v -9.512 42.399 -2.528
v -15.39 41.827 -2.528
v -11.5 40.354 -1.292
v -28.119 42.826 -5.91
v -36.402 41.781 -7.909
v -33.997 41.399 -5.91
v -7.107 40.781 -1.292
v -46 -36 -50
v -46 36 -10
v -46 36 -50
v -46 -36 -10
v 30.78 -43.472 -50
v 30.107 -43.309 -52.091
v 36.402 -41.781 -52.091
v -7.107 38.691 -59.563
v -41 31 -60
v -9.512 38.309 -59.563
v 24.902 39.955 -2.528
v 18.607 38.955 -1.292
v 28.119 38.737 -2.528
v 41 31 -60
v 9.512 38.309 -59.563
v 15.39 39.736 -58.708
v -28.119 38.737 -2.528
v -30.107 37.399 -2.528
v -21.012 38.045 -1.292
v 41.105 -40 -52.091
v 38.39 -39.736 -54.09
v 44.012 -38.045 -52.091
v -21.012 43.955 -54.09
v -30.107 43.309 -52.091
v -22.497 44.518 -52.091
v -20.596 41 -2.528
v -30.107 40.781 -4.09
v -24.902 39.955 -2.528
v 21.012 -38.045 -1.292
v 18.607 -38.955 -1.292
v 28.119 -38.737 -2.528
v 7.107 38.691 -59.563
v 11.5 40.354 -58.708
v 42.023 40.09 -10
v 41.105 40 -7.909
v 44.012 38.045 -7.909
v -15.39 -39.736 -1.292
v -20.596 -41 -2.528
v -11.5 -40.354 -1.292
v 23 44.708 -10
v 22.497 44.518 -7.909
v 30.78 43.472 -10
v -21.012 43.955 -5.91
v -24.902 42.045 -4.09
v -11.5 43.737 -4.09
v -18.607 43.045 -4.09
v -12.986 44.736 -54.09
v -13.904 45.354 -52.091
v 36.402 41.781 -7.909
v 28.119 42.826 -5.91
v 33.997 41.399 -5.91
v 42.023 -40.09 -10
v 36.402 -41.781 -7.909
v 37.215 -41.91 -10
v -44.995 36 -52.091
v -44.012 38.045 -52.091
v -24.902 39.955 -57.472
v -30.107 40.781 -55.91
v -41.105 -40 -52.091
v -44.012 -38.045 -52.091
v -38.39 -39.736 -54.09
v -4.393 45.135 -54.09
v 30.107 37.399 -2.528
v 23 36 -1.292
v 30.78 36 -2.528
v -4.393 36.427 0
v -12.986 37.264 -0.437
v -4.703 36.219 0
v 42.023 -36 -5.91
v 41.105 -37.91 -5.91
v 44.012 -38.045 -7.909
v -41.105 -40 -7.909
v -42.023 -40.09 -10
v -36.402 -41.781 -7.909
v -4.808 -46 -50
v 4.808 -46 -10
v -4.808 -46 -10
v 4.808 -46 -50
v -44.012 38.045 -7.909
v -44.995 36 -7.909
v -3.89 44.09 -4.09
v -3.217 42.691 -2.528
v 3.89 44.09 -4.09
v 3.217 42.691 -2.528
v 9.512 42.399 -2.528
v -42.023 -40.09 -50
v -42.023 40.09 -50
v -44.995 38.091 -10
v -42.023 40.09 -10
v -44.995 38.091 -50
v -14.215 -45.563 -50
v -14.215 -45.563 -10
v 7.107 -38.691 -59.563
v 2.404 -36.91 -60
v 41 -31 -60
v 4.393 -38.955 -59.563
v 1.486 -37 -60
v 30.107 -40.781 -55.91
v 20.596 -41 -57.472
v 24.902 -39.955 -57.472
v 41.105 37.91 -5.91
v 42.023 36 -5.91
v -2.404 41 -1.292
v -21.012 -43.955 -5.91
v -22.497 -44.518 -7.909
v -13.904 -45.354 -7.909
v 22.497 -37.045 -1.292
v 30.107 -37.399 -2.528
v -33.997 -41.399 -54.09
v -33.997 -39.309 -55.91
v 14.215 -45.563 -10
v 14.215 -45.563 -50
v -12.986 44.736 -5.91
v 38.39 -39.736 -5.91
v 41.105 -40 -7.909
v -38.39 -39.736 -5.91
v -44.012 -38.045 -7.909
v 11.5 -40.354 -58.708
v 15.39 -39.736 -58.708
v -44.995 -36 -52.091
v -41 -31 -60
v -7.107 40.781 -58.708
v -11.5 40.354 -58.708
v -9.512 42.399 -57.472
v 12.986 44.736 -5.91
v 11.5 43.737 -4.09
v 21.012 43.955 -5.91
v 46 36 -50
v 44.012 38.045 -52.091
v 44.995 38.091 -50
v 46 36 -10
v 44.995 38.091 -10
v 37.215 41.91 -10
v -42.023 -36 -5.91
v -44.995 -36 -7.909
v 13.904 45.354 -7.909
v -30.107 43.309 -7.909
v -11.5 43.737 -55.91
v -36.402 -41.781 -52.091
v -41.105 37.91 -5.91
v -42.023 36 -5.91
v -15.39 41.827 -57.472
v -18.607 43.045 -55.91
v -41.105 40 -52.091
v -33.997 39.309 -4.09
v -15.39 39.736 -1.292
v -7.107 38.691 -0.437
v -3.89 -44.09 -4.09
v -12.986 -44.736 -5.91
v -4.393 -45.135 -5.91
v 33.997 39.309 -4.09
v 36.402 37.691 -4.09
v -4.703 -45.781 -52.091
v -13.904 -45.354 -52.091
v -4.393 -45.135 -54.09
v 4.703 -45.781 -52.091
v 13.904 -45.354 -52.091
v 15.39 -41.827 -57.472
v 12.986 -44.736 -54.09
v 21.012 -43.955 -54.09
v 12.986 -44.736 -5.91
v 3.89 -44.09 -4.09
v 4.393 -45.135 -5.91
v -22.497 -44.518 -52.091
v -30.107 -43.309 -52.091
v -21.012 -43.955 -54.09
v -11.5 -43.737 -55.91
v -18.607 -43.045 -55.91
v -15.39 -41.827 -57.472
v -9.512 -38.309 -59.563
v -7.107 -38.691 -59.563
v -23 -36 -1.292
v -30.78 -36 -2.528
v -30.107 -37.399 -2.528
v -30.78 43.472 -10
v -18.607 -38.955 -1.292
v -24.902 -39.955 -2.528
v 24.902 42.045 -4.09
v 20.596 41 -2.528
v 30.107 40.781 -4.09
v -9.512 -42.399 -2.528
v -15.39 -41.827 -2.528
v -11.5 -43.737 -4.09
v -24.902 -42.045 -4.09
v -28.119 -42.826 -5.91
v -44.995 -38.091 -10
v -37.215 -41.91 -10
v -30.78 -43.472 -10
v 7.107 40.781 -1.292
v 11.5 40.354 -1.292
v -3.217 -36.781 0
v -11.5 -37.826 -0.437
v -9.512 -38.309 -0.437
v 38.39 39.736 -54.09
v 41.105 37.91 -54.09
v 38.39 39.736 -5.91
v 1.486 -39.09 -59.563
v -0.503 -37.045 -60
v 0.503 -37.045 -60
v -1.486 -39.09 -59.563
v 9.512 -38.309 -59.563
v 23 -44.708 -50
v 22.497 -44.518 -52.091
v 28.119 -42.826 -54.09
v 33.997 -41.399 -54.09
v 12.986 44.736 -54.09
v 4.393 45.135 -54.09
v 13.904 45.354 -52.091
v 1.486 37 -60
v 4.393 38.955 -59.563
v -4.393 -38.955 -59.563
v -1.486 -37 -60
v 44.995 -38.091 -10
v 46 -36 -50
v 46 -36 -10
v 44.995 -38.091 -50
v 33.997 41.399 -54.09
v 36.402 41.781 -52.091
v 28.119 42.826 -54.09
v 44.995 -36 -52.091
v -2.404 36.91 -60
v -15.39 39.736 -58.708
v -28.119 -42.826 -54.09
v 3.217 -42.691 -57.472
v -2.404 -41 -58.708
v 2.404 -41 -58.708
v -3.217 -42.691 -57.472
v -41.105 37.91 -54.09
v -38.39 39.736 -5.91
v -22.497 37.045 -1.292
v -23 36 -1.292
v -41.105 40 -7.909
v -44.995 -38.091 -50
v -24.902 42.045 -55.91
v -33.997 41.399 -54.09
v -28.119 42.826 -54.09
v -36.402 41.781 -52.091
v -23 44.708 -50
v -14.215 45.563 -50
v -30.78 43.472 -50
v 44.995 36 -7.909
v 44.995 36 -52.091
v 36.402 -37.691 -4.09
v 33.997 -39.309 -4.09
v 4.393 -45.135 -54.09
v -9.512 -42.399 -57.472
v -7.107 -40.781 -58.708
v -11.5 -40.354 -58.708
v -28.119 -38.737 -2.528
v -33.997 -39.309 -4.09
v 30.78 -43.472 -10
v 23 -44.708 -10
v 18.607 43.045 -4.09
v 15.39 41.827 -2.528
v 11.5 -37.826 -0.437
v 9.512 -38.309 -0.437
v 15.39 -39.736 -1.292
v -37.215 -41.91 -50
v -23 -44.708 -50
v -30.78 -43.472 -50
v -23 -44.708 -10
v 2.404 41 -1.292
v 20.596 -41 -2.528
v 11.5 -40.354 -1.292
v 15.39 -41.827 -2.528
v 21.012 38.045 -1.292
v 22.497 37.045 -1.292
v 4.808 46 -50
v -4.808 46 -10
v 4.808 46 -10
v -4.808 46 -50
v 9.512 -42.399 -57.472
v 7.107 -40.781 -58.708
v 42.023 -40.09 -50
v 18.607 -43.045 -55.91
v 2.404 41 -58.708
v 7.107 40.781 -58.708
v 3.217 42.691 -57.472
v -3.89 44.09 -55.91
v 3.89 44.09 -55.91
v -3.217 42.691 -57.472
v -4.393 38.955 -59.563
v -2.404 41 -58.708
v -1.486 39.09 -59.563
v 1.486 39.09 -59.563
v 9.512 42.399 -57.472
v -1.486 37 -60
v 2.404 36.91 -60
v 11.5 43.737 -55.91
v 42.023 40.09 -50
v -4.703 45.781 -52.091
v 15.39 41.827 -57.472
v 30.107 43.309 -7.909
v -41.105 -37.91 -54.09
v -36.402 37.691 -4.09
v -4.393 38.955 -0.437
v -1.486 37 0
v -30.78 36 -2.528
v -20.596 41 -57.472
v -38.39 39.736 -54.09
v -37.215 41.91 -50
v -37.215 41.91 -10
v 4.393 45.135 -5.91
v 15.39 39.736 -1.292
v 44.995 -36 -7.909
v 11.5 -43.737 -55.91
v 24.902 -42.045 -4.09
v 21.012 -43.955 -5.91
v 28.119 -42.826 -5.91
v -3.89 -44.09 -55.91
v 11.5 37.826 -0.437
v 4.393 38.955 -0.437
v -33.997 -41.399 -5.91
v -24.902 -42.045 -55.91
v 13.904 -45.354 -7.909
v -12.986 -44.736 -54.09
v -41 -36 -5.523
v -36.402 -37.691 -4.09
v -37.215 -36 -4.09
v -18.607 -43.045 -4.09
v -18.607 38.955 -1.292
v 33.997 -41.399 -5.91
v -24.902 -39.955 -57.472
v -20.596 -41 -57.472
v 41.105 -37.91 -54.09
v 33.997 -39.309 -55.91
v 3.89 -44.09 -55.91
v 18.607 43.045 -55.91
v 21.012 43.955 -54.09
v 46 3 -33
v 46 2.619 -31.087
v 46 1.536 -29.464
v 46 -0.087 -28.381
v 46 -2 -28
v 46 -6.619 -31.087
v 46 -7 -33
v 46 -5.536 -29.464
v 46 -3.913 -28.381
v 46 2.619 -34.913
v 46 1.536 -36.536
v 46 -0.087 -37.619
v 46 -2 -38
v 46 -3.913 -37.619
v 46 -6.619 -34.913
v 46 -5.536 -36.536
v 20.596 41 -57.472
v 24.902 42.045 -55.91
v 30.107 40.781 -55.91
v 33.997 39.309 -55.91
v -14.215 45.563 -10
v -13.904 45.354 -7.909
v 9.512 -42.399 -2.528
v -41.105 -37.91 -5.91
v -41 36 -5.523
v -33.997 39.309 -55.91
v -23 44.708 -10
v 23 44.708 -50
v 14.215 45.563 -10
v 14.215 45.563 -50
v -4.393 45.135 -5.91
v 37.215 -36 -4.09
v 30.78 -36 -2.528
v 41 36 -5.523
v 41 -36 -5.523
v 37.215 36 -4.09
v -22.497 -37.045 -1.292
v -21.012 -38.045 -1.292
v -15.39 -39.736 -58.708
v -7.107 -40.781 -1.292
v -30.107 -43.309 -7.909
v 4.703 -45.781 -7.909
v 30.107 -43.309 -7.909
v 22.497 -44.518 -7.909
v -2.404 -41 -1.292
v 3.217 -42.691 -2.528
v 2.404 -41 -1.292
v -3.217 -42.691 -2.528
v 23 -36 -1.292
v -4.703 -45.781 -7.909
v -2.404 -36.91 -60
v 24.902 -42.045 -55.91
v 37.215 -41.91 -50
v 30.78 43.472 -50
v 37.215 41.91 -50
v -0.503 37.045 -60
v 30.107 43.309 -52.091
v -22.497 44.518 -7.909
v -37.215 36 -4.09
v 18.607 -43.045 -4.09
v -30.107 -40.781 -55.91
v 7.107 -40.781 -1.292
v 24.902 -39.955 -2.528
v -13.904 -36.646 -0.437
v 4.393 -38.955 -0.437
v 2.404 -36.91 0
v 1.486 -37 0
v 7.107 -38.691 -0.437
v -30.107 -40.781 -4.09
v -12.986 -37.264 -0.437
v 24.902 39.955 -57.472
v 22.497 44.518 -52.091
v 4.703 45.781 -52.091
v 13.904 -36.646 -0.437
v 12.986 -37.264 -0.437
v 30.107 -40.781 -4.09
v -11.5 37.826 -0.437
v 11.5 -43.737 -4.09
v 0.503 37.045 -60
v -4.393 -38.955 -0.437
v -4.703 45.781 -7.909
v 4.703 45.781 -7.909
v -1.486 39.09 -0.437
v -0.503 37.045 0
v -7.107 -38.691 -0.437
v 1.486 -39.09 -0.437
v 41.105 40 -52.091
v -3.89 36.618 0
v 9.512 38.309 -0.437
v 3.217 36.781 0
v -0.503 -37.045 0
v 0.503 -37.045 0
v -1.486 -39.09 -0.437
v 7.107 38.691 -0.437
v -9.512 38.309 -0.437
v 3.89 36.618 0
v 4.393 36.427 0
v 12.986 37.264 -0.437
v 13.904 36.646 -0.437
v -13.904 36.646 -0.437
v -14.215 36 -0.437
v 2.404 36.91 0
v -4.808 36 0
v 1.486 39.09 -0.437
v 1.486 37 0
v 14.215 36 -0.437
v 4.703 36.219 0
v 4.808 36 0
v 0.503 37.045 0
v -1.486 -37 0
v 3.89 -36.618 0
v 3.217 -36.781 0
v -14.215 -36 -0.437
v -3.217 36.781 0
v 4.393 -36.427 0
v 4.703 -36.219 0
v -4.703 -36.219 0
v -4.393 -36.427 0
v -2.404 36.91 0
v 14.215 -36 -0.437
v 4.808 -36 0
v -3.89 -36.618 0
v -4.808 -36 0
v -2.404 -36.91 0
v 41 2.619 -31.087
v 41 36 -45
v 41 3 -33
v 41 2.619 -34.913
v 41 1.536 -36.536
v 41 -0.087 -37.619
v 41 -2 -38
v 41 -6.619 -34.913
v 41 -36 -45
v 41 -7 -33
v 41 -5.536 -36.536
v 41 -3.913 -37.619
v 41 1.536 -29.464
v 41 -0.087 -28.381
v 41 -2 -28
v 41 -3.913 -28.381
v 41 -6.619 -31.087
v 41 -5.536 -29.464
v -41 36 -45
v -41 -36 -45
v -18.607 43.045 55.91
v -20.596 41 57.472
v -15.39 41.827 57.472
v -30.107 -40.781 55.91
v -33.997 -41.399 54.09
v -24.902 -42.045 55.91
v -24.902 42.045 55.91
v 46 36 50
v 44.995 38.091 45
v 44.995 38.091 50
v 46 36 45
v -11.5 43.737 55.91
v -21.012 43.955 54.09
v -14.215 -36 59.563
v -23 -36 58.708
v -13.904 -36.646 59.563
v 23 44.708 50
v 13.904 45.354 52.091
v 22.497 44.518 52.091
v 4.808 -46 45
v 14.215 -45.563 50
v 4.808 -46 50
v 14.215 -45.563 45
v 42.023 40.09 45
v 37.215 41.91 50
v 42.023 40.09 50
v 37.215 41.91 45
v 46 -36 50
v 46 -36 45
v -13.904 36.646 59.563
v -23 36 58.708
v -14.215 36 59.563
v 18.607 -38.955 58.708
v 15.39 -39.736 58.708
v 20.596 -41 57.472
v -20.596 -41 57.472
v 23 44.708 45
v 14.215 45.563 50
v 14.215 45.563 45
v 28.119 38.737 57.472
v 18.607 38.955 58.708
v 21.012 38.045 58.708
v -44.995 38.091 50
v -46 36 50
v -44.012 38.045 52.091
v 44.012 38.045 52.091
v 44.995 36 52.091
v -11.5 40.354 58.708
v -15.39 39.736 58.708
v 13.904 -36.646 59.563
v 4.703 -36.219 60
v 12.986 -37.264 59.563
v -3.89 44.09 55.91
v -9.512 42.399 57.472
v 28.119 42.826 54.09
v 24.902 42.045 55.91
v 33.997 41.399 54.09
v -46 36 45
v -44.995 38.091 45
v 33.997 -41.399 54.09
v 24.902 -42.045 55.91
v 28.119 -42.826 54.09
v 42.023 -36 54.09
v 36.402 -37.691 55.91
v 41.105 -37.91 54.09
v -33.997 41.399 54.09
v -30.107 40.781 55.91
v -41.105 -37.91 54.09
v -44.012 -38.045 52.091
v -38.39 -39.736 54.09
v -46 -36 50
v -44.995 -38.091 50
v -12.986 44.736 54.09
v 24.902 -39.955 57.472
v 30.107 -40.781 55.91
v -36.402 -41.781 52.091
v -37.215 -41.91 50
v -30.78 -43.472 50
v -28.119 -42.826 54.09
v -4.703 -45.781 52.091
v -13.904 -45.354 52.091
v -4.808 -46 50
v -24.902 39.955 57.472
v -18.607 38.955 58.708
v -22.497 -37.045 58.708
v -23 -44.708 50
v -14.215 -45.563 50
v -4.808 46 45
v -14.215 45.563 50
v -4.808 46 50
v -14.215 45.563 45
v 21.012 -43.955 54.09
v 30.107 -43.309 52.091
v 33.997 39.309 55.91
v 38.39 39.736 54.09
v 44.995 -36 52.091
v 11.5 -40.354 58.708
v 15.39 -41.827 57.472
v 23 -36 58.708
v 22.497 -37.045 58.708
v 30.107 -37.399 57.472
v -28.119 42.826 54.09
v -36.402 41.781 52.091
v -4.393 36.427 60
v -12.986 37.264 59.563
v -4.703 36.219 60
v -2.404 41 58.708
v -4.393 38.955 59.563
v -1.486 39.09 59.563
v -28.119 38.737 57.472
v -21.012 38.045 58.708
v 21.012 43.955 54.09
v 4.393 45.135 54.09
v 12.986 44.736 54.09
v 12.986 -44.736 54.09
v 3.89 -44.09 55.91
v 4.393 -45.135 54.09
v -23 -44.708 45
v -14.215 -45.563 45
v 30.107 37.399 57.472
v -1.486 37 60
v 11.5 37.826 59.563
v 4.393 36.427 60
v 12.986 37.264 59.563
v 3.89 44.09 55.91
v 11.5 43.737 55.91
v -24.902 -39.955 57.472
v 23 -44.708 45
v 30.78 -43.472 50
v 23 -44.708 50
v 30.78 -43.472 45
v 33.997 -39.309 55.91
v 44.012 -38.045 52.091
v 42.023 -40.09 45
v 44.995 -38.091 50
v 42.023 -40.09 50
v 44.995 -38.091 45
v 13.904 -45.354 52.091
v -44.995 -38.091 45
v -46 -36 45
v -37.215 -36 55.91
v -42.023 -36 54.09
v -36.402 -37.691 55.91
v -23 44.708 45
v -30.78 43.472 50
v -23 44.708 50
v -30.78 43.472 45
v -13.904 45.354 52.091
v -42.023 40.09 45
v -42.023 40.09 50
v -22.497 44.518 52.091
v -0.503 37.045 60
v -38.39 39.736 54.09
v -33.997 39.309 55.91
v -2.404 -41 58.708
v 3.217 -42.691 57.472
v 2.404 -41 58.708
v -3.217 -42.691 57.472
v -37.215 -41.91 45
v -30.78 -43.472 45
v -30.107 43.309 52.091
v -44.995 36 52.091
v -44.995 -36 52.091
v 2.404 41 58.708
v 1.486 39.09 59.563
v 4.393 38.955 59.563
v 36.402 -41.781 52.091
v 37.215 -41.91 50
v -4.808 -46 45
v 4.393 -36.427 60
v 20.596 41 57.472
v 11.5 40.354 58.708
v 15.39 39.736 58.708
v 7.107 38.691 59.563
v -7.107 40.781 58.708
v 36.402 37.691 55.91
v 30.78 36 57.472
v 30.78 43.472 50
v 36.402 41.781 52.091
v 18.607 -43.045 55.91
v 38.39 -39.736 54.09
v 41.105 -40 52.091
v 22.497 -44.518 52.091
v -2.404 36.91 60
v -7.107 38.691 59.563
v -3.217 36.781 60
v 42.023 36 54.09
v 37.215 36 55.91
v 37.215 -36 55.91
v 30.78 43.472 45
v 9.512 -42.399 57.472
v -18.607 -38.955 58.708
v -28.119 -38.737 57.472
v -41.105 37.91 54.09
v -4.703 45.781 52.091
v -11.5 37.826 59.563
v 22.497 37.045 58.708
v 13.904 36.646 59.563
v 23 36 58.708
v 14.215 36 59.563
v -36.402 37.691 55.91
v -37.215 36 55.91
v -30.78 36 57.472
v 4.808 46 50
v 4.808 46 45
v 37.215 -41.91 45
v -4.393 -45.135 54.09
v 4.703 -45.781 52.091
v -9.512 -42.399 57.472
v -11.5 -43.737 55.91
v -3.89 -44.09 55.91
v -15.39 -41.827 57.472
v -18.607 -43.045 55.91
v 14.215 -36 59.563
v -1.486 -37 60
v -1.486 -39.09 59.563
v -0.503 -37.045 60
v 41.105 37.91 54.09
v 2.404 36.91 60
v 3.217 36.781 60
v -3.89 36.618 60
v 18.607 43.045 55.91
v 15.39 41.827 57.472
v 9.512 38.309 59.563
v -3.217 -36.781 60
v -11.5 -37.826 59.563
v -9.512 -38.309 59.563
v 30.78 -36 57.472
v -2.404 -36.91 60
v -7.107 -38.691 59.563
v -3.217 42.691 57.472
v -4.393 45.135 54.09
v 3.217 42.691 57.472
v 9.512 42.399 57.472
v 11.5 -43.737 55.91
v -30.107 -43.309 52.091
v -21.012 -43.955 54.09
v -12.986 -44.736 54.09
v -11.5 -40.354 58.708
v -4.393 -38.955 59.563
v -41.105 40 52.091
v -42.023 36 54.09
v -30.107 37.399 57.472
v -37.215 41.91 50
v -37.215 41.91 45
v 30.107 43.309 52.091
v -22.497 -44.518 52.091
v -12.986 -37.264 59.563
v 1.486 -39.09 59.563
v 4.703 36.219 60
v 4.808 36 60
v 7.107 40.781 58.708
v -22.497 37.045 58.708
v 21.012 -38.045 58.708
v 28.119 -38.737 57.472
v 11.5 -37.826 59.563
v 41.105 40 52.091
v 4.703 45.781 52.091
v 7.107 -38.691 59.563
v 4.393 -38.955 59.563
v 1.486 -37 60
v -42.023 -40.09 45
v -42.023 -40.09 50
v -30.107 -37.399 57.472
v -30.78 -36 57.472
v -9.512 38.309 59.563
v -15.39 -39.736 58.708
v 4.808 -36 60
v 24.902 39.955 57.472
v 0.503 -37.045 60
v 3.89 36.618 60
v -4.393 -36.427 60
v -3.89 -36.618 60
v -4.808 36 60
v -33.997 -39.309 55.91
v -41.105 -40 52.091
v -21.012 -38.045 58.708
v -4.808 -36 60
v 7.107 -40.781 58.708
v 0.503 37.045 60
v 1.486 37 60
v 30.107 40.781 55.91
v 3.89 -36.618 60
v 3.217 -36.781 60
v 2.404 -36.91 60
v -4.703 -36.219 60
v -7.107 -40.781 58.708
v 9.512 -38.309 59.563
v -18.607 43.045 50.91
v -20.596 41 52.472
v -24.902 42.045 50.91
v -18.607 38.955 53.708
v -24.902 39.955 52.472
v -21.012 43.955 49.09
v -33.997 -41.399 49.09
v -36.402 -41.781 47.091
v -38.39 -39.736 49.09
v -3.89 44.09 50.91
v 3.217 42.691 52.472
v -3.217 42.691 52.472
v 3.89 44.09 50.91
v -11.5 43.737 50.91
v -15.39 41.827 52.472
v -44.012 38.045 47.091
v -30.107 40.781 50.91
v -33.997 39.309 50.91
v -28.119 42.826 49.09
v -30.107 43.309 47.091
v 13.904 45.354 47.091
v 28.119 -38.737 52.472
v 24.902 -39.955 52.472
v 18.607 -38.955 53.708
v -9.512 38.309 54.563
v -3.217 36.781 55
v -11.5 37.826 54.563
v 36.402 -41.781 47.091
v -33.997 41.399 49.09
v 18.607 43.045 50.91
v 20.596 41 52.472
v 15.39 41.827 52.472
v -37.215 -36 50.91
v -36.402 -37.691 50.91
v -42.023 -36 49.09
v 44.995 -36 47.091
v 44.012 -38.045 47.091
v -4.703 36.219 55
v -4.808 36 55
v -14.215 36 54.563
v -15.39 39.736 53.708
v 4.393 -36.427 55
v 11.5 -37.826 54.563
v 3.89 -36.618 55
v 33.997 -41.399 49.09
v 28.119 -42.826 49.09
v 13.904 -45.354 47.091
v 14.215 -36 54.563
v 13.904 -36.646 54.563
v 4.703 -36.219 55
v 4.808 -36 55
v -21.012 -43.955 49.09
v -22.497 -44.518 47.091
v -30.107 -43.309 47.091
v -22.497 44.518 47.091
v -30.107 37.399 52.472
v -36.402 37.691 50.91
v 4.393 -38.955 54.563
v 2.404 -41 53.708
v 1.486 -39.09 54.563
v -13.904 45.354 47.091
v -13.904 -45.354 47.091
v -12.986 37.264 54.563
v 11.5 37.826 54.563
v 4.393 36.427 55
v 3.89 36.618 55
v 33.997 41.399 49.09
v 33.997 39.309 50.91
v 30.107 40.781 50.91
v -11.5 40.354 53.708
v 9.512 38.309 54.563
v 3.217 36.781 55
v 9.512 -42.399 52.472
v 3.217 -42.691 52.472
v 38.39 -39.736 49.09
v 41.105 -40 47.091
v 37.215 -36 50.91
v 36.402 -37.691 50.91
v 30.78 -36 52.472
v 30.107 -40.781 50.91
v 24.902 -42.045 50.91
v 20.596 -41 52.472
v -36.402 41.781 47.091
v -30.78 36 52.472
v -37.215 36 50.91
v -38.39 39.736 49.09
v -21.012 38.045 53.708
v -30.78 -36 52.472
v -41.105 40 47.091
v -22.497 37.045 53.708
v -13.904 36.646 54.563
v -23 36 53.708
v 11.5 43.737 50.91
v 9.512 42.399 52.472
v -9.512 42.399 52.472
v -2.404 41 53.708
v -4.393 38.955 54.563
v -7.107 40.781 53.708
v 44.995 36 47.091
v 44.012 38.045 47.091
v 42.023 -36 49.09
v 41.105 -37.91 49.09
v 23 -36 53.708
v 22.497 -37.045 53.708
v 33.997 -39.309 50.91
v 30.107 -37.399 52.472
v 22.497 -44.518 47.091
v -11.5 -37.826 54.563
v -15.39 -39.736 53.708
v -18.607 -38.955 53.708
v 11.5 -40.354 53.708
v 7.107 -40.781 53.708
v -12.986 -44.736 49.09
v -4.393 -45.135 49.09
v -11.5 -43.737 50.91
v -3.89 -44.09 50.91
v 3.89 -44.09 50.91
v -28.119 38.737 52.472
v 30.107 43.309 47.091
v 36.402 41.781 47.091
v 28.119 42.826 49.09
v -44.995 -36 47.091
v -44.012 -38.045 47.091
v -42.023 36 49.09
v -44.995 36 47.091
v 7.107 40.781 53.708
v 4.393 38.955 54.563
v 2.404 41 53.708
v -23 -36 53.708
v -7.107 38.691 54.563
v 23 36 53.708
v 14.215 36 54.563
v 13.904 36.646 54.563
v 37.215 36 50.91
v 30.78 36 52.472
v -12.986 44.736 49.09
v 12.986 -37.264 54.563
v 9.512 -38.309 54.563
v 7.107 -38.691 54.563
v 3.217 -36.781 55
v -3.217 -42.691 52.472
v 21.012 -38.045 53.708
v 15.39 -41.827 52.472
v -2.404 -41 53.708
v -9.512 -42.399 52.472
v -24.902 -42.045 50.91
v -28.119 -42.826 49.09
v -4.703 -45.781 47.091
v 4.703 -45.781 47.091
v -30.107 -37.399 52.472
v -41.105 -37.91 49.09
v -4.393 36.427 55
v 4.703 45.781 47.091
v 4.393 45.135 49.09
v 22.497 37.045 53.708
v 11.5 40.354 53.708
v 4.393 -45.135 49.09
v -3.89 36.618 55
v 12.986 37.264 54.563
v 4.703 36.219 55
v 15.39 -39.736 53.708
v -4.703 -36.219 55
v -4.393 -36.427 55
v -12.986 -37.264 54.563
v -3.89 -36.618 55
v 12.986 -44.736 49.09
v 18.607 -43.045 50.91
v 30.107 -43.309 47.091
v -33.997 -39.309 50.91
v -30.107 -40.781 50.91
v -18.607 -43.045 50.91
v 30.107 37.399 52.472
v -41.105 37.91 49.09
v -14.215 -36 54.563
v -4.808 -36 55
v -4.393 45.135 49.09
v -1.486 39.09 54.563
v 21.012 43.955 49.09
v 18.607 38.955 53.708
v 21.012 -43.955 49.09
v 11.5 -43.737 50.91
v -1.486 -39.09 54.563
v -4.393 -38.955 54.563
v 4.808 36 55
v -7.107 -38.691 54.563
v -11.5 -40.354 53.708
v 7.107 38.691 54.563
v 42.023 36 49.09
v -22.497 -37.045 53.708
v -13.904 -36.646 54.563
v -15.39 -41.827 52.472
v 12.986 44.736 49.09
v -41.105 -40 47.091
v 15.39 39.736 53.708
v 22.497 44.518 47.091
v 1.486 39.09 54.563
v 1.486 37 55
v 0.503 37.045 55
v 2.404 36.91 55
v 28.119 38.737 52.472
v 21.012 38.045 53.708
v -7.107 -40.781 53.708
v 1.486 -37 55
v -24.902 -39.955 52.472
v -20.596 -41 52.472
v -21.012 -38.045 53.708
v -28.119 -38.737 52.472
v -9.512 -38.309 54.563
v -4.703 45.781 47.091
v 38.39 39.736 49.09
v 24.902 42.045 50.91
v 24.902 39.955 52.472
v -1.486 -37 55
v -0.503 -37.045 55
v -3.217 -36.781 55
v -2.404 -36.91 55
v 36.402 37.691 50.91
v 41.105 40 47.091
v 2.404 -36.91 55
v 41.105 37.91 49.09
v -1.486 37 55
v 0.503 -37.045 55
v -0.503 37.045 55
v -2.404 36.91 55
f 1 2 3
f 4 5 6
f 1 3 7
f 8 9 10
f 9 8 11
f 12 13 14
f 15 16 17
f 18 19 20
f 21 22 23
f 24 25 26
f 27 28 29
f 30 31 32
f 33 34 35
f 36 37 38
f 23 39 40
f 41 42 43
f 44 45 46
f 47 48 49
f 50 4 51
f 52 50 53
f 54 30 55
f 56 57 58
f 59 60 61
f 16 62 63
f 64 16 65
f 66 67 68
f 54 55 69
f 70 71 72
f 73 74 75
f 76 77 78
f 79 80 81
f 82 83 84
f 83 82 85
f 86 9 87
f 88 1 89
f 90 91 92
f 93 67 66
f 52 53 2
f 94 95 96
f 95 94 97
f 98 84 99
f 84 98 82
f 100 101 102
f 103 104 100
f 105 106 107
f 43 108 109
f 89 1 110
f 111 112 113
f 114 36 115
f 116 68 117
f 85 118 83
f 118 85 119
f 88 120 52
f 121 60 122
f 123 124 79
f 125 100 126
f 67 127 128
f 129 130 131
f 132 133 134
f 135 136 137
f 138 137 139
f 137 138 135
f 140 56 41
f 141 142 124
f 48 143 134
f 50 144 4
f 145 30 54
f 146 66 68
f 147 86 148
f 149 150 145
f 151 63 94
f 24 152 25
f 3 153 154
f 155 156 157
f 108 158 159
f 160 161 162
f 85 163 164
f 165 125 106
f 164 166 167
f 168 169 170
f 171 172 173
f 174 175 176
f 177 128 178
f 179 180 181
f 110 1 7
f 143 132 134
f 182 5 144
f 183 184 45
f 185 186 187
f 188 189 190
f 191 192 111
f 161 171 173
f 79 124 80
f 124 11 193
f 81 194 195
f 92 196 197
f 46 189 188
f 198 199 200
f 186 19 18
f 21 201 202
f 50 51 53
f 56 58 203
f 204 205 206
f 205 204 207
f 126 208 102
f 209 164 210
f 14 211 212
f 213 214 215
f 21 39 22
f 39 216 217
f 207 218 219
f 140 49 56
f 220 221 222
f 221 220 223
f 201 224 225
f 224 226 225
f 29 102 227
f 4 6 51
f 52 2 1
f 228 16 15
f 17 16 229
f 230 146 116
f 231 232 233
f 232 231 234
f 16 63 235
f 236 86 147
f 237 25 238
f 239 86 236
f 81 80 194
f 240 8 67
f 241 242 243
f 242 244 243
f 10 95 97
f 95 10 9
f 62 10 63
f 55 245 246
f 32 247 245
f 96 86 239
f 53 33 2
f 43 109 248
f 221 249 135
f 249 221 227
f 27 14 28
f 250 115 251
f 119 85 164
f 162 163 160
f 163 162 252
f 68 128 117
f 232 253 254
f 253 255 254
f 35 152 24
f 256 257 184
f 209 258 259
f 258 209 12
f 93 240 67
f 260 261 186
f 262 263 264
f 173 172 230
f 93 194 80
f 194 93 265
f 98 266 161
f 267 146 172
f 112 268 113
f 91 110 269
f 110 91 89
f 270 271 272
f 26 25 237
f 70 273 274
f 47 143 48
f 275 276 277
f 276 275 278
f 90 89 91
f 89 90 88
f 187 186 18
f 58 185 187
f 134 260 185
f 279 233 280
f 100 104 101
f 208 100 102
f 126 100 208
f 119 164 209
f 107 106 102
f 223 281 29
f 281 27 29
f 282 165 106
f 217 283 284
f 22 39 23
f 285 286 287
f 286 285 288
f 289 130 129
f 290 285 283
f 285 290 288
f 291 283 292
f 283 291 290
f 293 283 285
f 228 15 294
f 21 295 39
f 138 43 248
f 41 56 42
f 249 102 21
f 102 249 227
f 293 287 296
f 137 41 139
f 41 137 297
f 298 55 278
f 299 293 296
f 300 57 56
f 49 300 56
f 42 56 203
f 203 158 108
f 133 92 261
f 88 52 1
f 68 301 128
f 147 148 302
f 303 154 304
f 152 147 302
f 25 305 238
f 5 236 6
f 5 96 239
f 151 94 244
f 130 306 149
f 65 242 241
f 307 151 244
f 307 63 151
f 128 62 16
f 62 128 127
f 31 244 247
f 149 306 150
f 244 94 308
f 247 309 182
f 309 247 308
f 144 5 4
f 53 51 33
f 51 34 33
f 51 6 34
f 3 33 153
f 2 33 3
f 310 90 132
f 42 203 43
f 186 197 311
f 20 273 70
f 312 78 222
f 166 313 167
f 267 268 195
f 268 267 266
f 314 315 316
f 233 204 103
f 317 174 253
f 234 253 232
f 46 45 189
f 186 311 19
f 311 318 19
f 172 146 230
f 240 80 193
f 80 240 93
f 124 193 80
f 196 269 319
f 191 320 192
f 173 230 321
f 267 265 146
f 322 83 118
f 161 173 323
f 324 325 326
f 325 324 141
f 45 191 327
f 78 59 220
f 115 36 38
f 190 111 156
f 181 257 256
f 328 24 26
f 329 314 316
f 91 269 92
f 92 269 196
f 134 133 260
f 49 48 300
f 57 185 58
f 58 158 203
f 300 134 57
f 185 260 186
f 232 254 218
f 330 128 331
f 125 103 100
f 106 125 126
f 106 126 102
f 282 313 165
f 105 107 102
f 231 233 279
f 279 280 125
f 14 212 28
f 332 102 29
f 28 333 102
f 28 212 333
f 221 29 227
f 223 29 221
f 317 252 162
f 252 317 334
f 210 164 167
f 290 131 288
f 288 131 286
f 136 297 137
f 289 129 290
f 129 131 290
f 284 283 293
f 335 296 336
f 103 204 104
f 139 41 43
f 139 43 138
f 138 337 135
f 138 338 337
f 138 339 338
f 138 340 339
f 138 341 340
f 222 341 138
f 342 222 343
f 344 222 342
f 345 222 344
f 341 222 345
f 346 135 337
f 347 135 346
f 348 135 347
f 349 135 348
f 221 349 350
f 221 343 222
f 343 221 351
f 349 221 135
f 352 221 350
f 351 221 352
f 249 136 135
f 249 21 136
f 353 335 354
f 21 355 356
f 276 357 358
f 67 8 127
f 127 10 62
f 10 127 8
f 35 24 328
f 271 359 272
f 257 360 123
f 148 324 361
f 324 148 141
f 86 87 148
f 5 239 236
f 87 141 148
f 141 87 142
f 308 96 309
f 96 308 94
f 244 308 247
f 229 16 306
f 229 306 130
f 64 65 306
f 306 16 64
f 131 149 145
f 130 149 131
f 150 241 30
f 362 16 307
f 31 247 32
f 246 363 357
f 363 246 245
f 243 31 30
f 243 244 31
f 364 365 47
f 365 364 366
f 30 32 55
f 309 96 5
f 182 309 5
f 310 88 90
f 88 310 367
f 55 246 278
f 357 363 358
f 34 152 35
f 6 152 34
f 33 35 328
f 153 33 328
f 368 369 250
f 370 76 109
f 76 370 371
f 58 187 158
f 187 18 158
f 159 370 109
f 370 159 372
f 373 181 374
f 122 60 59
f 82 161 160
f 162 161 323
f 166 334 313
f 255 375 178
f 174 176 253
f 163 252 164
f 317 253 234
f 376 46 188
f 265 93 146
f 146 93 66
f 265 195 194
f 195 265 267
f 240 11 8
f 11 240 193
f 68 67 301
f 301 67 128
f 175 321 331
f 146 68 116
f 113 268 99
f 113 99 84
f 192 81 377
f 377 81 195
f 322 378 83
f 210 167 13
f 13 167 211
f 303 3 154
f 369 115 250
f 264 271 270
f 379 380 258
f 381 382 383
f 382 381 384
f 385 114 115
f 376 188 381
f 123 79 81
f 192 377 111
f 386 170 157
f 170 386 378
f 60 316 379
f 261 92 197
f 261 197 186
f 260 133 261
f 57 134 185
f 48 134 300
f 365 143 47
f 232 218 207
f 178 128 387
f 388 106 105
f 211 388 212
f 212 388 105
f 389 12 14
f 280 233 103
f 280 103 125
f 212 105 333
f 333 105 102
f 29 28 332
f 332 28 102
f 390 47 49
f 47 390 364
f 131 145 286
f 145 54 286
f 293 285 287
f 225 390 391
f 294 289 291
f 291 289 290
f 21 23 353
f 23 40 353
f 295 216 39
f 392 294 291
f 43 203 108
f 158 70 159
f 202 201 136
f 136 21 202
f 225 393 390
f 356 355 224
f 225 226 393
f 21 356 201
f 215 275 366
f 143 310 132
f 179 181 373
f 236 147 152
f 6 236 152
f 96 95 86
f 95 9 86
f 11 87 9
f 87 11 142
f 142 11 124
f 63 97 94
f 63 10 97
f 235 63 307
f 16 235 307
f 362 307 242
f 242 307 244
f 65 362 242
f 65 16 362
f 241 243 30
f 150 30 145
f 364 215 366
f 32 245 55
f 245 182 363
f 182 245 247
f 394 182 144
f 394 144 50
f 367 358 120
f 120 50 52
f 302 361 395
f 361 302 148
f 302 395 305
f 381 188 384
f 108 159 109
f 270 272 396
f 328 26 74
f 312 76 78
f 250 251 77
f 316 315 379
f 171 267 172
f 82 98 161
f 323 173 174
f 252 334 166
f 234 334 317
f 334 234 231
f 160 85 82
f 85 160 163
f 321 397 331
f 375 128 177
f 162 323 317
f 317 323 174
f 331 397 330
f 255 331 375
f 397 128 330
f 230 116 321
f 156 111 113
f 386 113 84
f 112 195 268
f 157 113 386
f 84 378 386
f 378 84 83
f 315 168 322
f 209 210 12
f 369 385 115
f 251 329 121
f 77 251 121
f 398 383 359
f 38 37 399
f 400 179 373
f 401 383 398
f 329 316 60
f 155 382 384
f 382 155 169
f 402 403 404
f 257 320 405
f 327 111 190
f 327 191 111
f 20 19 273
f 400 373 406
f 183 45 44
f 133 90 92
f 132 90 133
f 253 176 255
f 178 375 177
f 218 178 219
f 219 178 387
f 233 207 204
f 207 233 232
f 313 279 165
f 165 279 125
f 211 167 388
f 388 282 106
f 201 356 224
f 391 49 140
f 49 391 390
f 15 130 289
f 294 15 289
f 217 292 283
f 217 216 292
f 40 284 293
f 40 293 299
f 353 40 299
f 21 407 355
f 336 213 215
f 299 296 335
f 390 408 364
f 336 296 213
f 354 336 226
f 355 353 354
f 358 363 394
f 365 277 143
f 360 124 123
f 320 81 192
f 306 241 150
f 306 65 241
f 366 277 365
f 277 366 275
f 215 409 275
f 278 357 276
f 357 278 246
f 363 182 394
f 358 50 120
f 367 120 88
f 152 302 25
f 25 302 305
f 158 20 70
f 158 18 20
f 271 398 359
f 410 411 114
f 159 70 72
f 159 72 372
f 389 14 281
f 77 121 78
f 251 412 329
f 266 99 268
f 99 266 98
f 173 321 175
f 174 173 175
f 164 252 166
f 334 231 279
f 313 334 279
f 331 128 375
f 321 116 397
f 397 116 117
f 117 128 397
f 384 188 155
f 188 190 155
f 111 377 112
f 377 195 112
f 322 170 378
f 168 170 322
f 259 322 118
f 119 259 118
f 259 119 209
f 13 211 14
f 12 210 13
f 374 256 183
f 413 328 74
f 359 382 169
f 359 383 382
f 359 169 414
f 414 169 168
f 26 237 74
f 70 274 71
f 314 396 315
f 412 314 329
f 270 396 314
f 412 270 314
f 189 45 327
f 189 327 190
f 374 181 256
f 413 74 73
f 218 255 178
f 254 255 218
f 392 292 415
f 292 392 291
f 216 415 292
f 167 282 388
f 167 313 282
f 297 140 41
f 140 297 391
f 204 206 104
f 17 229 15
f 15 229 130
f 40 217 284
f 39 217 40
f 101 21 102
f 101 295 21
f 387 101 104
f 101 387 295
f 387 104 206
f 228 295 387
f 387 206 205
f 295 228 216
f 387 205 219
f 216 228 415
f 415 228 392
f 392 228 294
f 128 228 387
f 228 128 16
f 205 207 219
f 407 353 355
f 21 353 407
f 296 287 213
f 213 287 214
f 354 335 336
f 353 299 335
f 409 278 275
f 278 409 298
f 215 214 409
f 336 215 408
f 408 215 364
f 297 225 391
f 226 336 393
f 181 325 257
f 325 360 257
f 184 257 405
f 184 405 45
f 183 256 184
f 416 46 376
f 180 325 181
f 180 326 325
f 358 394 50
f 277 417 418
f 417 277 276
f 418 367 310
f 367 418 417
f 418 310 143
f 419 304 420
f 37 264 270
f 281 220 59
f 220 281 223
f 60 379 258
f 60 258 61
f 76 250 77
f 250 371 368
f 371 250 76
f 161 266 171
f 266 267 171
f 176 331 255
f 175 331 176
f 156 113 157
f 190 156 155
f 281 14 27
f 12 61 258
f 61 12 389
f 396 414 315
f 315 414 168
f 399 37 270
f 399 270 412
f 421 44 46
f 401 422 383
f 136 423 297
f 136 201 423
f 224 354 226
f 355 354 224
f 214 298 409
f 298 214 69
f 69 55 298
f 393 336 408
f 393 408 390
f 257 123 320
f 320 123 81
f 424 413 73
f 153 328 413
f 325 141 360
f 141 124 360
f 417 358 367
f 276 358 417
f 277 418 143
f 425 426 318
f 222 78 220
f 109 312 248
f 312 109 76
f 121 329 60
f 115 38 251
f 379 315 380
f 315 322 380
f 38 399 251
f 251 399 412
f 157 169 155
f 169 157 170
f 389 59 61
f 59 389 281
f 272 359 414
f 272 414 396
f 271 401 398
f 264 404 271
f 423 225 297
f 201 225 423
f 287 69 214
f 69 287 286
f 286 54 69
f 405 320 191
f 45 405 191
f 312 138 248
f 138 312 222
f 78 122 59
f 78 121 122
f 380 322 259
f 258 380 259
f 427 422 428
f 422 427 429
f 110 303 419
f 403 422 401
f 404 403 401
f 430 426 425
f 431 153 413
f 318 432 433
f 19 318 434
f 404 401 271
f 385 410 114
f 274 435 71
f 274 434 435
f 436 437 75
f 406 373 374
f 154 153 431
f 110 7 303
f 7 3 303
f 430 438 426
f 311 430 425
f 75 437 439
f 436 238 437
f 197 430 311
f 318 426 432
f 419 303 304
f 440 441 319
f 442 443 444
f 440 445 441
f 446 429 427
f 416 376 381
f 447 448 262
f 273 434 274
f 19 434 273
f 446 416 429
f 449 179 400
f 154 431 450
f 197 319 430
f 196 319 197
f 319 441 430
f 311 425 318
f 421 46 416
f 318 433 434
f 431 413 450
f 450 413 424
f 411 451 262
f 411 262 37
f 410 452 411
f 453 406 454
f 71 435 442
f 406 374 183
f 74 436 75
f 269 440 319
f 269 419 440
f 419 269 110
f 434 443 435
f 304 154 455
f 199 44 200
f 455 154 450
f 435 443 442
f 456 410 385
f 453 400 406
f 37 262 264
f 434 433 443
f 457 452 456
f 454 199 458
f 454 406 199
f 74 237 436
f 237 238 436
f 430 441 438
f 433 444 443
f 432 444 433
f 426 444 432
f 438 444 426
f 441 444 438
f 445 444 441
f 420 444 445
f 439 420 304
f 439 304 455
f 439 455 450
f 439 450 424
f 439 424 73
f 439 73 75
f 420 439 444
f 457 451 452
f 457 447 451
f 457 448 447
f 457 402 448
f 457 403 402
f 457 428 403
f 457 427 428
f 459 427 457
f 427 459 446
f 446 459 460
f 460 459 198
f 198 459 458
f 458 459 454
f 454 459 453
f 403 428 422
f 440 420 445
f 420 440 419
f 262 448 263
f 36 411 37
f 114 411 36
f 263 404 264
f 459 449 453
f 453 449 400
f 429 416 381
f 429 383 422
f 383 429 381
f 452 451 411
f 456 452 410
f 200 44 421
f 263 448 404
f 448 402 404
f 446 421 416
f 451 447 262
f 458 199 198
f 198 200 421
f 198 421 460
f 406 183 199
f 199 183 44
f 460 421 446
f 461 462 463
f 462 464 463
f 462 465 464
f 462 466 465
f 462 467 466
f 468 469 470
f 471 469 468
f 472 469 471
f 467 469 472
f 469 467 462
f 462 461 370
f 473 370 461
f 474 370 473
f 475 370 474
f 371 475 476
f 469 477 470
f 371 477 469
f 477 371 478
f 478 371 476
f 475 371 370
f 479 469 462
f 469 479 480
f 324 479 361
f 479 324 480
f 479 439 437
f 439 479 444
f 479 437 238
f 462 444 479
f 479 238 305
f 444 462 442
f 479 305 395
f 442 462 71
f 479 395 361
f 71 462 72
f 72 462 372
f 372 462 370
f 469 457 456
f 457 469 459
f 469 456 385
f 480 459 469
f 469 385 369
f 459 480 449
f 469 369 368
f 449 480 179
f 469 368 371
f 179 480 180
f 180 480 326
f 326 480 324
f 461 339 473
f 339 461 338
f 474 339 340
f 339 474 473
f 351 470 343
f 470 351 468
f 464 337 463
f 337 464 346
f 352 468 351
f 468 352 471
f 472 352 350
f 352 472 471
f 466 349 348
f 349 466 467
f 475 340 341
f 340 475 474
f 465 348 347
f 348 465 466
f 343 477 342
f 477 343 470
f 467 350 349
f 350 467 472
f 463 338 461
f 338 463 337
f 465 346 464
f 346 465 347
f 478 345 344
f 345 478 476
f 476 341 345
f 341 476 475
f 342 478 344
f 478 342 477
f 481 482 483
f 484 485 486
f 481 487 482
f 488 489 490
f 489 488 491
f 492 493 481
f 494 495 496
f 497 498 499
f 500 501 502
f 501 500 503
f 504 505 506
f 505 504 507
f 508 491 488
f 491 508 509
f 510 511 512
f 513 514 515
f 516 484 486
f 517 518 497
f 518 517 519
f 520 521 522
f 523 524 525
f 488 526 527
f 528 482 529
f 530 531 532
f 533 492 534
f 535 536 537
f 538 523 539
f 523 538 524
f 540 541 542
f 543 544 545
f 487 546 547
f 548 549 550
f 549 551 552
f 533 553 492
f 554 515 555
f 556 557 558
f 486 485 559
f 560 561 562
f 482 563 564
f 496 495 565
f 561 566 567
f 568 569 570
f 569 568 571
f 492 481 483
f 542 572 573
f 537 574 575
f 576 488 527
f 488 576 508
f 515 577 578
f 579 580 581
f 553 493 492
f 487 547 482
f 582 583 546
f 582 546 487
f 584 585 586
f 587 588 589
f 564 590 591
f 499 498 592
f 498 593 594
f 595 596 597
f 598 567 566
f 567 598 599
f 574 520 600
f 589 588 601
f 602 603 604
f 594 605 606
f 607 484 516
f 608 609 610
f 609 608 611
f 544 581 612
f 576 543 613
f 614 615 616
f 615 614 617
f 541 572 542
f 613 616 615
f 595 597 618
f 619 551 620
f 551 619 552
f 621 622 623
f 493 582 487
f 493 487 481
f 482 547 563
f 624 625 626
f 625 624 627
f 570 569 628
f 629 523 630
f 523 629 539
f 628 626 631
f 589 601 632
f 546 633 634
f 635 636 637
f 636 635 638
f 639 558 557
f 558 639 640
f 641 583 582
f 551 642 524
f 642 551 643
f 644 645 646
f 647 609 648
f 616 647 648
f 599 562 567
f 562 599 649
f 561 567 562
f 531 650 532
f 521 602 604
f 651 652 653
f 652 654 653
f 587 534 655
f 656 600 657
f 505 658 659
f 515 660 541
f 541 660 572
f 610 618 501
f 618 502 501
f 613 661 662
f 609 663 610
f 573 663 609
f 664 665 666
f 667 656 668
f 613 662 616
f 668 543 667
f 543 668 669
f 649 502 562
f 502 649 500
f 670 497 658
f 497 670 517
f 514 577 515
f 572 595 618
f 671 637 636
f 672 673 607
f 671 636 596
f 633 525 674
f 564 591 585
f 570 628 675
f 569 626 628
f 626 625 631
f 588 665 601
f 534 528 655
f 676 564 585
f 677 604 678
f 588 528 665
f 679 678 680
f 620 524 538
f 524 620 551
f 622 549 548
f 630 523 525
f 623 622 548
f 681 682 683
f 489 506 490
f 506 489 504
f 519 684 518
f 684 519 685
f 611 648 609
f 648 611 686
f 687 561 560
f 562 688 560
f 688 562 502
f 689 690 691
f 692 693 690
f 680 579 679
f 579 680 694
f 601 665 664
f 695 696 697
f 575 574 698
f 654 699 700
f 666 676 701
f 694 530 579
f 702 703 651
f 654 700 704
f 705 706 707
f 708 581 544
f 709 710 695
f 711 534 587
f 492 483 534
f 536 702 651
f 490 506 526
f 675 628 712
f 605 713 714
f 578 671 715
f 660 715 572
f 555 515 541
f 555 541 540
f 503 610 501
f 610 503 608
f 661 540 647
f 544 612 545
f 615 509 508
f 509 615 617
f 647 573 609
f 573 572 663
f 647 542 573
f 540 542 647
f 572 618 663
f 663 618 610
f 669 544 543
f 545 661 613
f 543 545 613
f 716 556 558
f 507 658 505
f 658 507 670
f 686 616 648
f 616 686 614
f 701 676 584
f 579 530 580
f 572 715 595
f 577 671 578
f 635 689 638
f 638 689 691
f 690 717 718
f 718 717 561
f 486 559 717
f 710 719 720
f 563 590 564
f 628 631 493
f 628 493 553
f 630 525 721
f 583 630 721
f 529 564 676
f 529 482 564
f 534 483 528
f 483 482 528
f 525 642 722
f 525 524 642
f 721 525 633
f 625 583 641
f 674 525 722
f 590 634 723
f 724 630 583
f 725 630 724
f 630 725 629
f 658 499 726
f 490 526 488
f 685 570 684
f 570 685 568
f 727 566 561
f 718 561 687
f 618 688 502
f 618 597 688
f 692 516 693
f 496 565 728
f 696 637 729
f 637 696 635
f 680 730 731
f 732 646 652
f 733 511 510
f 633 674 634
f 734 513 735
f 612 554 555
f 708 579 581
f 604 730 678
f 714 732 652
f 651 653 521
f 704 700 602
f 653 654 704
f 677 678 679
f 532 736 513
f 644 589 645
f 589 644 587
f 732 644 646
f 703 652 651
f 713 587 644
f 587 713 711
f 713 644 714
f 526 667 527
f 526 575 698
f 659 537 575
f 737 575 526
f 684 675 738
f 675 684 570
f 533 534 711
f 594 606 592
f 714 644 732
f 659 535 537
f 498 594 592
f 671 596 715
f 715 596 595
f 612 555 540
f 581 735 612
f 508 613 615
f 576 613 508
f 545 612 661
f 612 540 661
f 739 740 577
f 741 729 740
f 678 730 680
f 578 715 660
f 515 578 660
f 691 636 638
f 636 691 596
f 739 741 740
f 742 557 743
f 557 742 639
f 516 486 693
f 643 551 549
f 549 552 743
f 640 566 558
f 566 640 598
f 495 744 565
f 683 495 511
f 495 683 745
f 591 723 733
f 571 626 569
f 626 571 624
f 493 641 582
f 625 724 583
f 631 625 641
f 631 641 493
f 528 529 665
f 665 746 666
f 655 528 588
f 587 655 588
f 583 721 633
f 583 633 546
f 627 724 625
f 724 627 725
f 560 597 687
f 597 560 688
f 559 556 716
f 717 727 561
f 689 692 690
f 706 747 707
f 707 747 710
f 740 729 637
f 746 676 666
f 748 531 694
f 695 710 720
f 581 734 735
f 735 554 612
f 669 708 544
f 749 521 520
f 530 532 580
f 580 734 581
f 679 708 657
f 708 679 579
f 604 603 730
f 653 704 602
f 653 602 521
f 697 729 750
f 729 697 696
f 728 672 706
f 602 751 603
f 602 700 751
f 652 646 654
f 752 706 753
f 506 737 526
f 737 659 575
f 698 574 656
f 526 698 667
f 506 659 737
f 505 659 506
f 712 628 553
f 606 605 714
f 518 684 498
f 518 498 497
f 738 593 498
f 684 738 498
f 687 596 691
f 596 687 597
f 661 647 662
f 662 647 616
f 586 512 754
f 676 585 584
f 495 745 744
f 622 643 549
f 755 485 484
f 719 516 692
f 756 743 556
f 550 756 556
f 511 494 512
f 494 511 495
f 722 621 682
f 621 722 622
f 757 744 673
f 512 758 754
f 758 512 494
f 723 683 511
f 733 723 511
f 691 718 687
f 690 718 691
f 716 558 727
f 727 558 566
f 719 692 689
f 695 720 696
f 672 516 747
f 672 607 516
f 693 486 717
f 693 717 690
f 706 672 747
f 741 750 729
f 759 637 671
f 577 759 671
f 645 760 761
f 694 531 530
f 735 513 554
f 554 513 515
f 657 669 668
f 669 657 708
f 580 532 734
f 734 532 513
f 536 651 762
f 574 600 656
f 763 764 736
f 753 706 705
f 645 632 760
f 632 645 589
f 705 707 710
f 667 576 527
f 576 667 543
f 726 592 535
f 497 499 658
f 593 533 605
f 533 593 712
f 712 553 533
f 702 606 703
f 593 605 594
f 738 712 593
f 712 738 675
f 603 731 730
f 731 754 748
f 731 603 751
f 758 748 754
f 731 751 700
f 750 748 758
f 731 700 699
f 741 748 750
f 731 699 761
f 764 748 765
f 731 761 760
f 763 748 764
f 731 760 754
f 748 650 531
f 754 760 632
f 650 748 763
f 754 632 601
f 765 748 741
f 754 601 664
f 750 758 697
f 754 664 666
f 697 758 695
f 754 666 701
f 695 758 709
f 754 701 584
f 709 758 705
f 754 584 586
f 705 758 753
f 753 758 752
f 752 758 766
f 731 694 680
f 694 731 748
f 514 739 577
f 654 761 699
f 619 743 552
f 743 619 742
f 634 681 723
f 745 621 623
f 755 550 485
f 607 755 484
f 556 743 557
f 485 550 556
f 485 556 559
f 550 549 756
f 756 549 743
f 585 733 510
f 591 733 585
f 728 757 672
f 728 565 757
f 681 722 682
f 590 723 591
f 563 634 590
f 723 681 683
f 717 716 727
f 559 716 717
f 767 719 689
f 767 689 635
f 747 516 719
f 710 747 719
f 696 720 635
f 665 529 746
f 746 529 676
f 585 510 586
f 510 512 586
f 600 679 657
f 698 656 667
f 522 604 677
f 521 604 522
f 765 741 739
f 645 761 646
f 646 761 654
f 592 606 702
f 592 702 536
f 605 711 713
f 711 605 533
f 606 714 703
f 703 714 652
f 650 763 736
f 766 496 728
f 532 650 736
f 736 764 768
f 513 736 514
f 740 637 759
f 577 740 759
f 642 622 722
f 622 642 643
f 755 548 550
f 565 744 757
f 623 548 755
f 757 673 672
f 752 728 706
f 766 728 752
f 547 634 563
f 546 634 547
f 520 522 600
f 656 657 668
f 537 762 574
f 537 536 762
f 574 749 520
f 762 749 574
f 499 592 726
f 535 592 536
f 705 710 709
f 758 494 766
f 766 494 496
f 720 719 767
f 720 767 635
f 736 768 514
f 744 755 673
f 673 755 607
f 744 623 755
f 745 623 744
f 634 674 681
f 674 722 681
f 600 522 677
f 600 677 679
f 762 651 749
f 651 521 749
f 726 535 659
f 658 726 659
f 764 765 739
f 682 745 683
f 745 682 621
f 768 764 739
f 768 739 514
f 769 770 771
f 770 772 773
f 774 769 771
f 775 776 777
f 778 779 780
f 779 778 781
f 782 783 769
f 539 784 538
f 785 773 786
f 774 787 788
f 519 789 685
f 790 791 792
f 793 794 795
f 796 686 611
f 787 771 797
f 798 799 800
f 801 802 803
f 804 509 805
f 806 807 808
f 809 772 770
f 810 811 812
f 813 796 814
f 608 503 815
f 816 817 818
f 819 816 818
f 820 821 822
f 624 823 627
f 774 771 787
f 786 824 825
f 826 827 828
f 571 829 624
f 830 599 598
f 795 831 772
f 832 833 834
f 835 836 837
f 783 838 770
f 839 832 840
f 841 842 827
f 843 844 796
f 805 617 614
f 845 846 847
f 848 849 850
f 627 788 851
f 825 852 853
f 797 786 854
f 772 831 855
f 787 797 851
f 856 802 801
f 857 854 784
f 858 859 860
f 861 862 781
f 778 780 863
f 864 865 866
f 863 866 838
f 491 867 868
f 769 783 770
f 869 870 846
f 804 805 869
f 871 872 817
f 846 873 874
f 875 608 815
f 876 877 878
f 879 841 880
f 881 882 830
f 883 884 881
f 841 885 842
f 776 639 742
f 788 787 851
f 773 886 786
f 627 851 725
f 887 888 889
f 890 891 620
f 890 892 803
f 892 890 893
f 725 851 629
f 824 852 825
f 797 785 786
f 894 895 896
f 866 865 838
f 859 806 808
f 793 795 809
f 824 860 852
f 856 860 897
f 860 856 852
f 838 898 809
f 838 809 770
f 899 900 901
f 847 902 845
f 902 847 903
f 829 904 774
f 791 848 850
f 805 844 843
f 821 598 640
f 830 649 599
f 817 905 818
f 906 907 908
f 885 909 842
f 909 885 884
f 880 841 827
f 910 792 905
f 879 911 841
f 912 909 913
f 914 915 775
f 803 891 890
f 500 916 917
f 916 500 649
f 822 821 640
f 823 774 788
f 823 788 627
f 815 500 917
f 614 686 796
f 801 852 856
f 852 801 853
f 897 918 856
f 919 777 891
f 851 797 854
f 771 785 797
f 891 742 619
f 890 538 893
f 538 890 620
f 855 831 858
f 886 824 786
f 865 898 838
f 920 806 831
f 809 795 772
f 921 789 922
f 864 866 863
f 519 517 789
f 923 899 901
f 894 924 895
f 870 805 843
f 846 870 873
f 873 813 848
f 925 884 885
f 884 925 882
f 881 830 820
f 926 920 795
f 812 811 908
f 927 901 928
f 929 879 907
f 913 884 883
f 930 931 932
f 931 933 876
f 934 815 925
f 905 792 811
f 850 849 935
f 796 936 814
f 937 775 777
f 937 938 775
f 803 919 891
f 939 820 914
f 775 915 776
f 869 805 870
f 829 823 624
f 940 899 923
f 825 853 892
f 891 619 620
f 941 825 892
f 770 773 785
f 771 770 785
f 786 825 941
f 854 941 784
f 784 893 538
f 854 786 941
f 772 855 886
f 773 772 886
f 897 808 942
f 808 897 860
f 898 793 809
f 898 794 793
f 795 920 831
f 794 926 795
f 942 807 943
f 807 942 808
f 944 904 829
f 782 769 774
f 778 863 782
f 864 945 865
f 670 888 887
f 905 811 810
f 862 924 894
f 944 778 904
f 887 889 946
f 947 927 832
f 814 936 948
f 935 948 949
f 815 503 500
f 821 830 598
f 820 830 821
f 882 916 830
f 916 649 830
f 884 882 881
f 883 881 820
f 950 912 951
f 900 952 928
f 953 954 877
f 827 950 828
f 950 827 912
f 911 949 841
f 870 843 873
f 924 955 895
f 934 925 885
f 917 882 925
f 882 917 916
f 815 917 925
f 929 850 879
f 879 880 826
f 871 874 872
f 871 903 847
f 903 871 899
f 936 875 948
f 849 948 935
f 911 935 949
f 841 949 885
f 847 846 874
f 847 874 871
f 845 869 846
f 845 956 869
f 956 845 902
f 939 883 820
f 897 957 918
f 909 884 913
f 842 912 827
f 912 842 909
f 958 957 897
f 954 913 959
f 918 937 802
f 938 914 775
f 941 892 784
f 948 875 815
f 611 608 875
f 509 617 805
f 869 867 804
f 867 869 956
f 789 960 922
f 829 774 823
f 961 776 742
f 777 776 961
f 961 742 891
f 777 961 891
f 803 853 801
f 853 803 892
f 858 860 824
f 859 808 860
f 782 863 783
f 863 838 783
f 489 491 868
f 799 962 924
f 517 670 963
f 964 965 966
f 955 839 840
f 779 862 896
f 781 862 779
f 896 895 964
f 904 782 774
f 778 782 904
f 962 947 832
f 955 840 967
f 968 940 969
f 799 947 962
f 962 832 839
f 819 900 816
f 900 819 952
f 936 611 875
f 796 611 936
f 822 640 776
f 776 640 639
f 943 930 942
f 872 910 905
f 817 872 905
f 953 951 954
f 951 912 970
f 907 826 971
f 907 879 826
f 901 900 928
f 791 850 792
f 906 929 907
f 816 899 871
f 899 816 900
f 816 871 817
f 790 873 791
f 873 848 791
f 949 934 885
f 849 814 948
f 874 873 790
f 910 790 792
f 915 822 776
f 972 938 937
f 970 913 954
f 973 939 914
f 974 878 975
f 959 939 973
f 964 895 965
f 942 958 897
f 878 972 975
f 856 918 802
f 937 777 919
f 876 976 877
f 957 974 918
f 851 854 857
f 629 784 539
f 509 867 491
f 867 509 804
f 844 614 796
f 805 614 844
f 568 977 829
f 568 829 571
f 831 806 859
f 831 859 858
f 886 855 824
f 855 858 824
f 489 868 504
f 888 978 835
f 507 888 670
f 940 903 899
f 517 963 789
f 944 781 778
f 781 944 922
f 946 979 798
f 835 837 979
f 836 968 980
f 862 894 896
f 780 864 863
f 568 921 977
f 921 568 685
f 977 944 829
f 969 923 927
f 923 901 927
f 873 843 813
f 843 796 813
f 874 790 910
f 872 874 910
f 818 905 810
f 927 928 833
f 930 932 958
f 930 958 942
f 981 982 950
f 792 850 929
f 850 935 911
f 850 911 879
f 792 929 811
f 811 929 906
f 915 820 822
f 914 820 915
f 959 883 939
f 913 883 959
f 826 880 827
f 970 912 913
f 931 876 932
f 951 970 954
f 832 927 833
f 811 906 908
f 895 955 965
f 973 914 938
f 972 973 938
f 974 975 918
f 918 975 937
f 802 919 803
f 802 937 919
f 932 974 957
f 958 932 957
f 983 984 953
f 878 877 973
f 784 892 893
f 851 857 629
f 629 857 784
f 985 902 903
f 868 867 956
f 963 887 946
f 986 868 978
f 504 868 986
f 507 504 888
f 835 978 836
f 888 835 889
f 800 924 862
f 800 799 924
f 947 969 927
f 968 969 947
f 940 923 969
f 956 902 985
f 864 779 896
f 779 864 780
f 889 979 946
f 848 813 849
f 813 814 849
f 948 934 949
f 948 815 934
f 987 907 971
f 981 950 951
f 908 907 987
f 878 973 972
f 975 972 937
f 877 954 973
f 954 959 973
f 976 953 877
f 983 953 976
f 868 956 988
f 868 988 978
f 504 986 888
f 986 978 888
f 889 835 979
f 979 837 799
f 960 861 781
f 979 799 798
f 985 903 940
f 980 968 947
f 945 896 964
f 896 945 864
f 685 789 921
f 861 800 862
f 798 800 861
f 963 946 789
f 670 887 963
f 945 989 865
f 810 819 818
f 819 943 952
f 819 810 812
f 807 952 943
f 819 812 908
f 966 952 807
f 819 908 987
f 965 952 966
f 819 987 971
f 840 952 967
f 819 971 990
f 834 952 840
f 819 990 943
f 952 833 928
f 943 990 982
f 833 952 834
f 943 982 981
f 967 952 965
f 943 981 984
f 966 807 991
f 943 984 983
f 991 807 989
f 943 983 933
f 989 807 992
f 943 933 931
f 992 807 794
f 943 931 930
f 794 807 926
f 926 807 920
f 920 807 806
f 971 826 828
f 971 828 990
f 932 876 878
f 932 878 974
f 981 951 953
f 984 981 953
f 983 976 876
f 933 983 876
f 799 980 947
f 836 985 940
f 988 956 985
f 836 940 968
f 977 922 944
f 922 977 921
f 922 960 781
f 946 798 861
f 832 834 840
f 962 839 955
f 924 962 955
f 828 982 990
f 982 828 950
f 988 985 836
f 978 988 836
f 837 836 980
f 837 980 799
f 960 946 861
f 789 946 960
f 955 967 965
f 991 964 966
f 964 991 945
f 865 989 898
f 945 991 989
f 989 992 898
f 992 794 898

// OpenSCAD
module body(w,l,h) {
    difference() {
        hull() {
            for(y = [h/2,-h/2])
                for(x = [l/2, -l/2])
                    translate([0,x,y])resize(newsize = [w,                20,20])sphere(r=10);
            translate([0,0,-h/2-5])cube([w-10,l-10,10],center=        true);
        }
        translate([0,0,10])cube([w-10,l,h+10],center=true);
         translate([30,-2,-3])rotate([0,90,0])cylinder(h=20,r1=5,r2=5);
    }
}

module cap(w,l,h) {
    difference() {
        hull() {
            for(y = [h/2,-h/2])
                for(x = [l/2, -l/2])
                    translate([0,x,y])resize(newsize = [w,                20,20])sphere(r=10);
        }
        hull() {
            for(y = [h/2,-h/2])
                for(x = [l/2, -l/2])
                    translate([0,x,y-5])resize(newsize = [w,                20,20])sphere(r=10);
        }
        translate([0,0,-10])cube([120,100,50],center=true);
    }  
}

translate([0,0,-30])body(92,72,40);
translate([0,0,30])cap(92,72,40);
